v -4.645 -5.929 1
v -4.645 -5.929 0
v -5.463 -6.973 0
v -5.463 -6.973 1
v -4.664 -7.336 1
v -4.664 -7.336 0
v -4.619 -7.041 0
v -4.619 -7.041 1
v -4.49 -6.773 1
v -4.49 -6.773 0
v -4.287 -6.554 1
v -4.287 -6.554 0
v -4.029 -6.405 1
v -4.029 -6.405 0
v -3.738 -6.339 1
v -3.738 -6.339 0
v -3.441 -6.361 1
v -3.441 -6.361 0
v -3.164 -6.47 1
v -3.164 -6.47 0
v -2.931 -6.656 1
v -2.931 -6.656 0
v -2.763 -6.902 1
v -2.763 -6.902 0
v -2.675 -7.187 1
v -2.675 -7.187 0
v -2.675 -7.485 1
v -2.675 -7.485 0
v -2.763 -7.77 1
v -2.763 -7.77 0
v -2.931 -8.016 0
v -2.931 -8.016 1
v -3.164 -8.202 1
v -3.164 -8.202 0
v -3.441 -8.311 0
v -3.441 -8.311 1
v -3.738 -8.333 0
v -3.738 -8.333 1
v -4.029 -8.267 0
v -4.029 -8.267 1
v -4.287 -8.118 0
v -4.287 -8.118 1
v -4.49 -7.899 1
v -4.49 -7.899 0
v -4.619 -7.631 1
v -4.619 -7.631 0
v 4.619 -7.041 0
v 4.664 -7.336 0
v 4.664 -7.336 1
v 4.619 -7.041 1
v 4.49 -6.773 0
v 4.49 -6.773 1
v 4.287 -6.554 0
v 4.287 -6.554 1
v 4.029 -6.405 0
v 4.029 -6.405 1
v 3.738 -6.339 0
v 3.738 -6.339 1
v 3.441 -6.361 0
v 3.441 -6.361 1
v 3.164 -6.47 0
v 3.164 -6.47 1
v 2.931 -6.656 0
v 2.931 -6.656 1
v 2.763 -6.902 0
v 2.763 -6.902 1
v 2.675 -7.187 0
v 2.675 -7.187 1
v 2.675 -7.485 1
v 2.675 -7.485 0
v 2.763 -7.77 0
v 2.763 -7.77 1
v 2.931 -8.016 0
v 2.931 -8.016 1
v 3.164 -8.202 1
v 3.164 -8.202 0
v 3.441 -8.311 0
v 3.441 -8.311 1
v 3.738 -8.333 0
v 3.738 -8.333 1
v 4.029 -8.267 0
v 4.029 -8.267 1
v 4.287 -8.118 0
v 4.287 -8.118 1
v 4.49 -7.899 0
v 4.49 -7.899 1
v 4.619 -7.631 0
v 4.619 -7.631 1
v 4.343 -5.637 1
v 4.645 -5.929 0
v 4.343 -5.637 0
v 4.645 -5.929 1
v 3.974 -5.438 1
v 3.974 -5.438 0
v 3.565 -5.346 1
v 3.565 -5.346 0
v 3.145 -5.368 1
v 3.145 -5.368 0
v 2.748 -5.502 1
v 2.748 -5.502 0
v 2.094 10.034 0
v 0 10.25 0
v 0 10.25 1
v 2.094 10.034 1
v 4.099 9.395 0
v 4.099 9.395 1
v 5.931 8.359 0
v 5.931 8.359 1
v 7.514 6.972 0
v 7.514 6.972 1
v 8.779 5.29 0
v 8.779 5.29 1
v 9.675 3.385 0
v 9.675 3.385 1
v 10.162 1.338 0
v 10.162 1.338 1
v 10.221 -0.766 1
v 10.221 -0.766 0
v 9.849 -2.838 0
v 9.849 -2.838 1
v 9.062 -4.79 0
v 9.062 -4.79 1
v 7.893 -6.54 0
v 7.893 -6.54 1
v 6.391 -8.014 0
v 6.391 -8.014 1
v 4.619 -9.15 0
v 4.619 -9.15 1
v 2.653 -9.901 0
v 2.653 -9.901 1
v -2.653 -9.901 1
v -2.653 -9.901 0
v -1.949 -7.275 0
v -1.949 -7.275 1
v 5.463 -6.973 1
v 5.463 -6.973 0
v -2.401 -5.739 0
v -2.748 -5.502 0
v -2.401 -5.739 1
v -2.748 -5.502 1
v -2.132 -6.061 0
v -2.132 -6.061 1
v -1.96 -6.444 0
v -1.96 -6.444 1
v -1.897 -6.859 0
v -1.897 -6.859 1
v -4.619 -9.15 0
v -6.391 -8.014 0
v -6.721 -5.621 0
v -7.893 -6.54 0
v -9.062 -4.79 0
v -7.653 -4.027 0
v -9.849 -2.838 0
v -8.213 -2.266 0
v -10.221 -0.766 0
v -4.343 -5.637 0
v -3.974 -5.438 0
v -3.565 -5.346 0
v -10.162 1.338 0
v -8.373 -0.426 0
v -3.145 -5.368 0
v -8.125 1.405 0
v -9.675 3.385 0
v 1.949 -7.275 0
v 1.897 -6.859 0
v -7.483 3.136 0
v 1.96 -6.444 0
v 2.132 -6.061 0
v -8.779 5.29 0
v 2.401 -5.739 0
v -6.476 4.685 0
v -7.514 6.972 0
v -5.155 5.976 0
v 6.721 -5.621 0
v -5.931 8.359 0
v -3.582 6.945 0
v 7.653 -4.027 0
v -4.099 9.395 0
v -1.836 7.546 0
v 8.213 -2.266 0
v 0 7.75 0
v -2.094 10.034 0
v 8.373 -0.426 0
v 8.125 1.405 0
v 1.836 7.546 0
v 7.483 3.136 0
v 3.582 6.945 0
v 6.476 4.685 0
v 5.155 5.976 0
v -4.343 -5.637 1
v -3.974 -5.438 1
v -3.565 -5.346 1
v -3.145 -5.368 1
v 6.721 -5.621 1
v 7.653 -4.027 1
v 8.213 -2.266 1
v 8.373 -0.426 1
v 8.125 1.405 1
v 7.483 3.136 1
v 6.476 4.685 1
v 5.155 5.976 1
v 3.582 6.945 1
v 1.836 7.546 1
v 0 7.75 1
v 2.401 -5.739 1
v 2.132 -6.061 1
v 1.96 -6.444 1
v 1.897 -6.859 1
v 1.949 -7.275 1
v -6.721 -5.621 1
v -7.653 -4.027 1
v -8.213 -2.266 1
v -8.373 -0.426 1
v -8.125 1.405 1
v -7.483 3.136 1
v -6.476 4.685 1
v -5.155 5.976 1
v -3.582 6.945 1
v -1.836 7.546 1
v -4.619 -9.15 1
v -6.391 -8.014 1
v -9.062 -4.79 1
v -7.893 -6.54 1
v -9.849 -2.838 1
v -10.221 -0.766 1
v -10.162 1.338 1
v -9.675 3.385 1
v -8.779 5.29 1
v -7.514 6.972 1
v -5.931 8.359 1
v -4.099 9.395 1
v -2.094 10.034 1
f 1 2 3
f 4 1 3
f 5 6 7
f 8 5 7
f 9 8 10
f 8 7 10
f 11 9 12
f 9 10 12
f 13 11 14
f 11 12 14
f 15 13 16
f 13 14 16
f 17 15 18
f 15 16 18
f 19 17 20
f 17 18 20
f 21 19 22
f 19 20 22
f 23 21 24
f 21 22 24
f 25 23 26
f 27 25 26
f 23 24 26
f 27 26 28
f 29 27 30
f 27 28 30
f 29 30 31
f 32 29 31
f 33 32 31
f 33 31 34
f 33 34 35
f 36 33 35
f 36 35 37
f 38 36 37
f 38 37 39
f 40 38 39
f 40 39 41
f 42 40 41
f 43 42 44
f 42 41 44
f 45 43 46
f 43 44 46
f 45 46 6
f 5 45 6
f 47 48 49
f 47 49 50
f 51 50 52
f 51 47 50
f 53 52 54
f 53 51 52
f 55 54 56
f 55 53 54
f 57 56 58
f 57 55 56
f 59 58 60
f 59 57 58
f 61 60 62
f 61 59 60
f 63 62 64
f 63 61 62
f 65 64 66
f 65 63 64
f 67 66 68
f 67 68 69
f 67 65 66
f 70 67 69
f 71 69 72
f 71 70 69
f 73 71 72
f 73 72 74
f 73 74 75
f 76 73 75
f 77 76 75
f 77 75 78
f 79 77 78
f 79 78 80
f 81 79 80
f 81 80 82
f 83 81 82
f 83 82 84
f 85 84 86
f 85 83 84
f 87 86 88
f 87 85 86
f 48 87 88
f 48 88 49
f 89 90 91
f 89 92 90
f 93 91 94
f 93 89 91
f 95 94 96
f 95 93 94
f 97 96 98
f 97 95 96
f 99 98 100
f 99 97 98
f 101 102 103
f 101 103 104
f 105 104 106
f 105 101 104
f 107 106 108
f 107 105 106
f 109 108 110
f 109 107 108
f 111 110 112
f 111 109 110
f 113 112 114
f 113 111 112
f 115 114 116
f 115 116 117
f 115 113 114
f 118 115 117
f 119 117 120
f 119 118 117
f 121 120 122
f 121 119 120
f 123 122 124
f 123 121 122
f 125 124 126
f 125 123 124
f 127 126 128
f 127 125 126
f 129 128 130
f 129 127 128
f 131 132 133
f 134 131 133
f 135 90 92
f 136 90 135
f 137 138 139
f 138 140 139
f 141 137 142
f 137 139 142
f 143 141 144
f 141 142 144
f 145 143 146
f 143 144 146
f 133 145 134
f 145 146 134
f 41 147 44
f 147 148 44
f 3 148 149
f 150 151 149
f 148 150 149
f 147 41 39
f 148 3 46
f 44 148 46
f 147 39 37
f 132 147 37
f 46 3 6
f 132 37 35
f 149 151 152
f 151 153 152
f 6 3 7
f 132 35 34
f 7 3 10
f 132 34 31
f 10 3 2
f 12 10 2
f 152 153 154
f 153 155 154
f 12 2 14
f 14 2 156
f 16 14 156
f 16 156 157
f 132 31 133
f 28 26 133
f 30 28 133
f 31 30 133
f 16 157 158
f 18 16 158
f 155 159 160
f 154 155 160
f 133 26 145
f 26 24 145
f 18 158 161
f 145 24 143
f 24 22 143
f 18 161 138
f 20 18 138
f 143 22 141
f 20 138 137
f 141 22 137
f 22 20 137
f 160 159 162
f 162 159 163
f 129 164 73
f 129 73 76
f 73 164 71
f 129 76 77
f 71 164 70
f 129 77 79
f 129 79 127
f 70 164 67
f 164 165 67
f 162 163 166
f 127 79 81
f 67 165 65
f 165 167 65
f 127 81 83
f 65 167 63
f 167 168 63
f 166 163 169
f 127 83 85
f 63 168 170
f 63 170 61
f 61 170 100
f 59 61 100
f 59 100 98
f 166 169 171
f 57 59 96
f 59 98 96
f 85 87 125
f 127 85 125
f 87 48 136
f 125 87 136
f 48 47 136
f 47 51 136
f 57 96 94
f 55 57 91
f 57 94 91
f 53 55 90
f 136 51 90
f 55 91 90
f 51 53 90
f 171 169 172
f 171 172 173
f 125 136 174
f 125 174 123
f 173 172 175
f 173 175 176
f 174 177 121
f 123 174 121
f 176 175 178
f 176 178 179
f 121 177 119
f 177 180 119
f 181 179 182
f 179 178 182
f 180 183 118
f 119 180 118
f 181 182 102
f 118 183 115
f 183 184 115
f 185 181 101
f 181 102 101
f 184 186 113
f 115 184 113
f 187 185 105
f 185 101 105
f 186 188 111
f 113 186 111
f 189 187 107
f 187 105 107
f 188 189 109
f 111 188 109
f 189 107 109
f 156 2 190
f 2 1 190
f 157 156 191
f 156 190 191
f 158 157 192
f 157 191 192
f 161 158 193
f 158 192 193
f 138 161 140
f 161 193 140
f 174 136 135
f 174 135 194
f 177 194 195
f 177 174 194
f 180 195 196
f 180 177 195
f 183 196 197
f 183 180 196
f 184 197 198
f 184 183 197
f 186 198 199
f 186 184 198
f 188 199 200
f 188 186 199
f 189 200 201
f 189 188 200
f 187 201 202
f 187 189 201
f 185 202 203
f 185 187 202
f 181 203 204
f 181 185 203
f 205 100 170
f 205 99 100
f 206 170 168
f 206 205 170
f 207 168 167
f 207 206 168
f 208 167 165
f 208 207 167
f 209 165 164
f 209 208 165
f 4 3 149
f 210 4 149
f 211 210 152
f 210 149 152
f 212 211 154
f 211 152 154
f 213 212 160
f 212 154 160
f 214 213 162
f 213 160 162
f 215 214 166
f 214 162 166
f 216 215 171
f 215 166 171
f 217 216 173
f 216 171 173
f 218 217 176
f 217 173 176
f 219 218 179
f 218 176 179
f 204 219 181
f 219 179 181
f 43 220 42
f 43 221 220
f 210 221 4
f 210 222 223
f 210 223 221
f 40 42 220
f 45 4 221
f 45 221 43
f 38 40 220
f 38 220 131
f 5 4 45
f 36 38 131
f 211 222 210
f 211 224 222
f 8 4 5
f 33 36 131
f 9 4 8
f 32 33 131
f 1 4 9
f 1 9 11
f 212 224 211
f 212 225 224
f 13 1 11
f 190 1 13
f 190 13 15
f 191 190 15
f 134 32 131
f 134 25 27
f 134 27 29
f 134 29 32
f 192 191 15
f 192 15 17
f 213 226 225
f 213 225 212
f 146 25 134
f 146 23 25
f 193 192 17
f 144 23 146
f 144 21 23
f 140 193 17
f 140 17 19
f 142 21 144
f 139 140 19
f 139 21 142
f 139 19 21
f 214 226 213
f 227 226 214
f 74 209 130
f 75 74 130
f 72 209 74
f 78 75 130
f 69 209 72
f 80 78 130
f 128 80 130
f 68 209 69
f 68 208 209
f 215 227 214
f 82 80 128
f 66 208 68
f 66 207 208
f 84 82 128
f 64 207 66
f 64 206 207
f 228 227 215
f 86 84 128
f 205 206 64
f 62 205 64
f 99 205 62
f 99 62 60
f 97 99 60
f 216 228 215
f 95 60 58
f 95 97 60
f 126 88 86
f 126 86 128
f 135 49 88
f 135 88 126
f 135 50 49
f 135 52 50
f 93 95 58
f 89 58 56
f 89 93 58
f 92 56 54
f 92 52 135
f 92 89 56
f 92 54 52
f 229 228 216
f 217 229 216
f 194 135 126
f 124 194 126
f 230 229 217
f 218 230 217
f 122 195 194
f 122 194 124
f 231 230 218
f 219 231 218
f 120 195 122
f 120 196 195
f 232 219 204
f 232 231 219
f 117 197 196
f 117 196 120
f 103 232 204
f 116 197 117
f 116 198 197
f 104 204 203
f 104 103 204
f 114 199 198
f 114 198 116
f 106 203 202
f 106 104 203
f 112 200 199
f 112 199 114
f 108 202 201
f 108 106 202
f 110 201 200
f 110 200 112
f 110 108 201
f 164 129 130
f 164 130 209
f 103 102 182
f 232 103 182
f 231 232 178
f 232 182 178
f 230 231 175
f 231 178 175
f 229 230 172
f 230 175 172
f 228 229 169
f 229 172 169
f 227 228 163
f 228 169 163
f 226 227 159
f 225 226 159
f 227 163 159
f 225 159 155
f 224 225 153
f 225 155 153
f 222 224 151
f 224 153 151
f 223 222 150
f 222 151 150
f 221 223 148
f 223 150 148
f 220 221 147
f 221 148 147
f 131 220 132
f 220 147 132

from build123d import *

# Parameters (mm, degrees)
SKETCH2_R           = 1
BOSS_EXTRUDE1_DEPTH = 1
FILLET1_R           = 1.5375


with BuildPart() as part:
    # Sketch2 → Boss-Extrude1 (new body)
    with BuildSketch(Plane.XY):
        with BuildLine():
            Line((3.870772643, -4.941210038), (5.462614208, -6.973265197))
            ThreePointArc((5.462614208, -6.973265197), (7.851985291, 2.288237372), (0, 7.75))
            Line((0, 7.75), (0, 10.25))
            ThreePointArc((0, 10.25), (10.162309829, 1.33789347), (2.652895212, -9.900739719))
            Line((2.652895212, -9.900739719), (1.624559903, -6.062940097))
            Line((1.624559903, -6.062940097), (3.870772643, -4.941210038))
        make_face()
        with Locations((3.663555031, -7.33610009)):
            Circle(SKETCH2_R, mode=Mode.SUBTRACT)
    extrude(amount=BOSS_EXTRUDE1_DEPTH)

    # Fillet1
    fillet1_edges = [part.edges().sort_by_distance(p)[0] for p in [
        (3.870772643, -4.941210038, 0.5),
        (1.624559903, -6.062940097, 0.5),
    ]]
    fillet(fillet1_edges, radius=FILLET1_R - 0.0001)  # a hair under: the kernel refuses the full size

    # Mirror1: part across plane


with BuildPart() as part_1:
    add(part.part)
    add(part.part.mirror(Plane(origin=(0, 10.25, 1), x_dir=(0, 0, 1), z_dir=(1, 0, 0))))


solid = part_1.part
